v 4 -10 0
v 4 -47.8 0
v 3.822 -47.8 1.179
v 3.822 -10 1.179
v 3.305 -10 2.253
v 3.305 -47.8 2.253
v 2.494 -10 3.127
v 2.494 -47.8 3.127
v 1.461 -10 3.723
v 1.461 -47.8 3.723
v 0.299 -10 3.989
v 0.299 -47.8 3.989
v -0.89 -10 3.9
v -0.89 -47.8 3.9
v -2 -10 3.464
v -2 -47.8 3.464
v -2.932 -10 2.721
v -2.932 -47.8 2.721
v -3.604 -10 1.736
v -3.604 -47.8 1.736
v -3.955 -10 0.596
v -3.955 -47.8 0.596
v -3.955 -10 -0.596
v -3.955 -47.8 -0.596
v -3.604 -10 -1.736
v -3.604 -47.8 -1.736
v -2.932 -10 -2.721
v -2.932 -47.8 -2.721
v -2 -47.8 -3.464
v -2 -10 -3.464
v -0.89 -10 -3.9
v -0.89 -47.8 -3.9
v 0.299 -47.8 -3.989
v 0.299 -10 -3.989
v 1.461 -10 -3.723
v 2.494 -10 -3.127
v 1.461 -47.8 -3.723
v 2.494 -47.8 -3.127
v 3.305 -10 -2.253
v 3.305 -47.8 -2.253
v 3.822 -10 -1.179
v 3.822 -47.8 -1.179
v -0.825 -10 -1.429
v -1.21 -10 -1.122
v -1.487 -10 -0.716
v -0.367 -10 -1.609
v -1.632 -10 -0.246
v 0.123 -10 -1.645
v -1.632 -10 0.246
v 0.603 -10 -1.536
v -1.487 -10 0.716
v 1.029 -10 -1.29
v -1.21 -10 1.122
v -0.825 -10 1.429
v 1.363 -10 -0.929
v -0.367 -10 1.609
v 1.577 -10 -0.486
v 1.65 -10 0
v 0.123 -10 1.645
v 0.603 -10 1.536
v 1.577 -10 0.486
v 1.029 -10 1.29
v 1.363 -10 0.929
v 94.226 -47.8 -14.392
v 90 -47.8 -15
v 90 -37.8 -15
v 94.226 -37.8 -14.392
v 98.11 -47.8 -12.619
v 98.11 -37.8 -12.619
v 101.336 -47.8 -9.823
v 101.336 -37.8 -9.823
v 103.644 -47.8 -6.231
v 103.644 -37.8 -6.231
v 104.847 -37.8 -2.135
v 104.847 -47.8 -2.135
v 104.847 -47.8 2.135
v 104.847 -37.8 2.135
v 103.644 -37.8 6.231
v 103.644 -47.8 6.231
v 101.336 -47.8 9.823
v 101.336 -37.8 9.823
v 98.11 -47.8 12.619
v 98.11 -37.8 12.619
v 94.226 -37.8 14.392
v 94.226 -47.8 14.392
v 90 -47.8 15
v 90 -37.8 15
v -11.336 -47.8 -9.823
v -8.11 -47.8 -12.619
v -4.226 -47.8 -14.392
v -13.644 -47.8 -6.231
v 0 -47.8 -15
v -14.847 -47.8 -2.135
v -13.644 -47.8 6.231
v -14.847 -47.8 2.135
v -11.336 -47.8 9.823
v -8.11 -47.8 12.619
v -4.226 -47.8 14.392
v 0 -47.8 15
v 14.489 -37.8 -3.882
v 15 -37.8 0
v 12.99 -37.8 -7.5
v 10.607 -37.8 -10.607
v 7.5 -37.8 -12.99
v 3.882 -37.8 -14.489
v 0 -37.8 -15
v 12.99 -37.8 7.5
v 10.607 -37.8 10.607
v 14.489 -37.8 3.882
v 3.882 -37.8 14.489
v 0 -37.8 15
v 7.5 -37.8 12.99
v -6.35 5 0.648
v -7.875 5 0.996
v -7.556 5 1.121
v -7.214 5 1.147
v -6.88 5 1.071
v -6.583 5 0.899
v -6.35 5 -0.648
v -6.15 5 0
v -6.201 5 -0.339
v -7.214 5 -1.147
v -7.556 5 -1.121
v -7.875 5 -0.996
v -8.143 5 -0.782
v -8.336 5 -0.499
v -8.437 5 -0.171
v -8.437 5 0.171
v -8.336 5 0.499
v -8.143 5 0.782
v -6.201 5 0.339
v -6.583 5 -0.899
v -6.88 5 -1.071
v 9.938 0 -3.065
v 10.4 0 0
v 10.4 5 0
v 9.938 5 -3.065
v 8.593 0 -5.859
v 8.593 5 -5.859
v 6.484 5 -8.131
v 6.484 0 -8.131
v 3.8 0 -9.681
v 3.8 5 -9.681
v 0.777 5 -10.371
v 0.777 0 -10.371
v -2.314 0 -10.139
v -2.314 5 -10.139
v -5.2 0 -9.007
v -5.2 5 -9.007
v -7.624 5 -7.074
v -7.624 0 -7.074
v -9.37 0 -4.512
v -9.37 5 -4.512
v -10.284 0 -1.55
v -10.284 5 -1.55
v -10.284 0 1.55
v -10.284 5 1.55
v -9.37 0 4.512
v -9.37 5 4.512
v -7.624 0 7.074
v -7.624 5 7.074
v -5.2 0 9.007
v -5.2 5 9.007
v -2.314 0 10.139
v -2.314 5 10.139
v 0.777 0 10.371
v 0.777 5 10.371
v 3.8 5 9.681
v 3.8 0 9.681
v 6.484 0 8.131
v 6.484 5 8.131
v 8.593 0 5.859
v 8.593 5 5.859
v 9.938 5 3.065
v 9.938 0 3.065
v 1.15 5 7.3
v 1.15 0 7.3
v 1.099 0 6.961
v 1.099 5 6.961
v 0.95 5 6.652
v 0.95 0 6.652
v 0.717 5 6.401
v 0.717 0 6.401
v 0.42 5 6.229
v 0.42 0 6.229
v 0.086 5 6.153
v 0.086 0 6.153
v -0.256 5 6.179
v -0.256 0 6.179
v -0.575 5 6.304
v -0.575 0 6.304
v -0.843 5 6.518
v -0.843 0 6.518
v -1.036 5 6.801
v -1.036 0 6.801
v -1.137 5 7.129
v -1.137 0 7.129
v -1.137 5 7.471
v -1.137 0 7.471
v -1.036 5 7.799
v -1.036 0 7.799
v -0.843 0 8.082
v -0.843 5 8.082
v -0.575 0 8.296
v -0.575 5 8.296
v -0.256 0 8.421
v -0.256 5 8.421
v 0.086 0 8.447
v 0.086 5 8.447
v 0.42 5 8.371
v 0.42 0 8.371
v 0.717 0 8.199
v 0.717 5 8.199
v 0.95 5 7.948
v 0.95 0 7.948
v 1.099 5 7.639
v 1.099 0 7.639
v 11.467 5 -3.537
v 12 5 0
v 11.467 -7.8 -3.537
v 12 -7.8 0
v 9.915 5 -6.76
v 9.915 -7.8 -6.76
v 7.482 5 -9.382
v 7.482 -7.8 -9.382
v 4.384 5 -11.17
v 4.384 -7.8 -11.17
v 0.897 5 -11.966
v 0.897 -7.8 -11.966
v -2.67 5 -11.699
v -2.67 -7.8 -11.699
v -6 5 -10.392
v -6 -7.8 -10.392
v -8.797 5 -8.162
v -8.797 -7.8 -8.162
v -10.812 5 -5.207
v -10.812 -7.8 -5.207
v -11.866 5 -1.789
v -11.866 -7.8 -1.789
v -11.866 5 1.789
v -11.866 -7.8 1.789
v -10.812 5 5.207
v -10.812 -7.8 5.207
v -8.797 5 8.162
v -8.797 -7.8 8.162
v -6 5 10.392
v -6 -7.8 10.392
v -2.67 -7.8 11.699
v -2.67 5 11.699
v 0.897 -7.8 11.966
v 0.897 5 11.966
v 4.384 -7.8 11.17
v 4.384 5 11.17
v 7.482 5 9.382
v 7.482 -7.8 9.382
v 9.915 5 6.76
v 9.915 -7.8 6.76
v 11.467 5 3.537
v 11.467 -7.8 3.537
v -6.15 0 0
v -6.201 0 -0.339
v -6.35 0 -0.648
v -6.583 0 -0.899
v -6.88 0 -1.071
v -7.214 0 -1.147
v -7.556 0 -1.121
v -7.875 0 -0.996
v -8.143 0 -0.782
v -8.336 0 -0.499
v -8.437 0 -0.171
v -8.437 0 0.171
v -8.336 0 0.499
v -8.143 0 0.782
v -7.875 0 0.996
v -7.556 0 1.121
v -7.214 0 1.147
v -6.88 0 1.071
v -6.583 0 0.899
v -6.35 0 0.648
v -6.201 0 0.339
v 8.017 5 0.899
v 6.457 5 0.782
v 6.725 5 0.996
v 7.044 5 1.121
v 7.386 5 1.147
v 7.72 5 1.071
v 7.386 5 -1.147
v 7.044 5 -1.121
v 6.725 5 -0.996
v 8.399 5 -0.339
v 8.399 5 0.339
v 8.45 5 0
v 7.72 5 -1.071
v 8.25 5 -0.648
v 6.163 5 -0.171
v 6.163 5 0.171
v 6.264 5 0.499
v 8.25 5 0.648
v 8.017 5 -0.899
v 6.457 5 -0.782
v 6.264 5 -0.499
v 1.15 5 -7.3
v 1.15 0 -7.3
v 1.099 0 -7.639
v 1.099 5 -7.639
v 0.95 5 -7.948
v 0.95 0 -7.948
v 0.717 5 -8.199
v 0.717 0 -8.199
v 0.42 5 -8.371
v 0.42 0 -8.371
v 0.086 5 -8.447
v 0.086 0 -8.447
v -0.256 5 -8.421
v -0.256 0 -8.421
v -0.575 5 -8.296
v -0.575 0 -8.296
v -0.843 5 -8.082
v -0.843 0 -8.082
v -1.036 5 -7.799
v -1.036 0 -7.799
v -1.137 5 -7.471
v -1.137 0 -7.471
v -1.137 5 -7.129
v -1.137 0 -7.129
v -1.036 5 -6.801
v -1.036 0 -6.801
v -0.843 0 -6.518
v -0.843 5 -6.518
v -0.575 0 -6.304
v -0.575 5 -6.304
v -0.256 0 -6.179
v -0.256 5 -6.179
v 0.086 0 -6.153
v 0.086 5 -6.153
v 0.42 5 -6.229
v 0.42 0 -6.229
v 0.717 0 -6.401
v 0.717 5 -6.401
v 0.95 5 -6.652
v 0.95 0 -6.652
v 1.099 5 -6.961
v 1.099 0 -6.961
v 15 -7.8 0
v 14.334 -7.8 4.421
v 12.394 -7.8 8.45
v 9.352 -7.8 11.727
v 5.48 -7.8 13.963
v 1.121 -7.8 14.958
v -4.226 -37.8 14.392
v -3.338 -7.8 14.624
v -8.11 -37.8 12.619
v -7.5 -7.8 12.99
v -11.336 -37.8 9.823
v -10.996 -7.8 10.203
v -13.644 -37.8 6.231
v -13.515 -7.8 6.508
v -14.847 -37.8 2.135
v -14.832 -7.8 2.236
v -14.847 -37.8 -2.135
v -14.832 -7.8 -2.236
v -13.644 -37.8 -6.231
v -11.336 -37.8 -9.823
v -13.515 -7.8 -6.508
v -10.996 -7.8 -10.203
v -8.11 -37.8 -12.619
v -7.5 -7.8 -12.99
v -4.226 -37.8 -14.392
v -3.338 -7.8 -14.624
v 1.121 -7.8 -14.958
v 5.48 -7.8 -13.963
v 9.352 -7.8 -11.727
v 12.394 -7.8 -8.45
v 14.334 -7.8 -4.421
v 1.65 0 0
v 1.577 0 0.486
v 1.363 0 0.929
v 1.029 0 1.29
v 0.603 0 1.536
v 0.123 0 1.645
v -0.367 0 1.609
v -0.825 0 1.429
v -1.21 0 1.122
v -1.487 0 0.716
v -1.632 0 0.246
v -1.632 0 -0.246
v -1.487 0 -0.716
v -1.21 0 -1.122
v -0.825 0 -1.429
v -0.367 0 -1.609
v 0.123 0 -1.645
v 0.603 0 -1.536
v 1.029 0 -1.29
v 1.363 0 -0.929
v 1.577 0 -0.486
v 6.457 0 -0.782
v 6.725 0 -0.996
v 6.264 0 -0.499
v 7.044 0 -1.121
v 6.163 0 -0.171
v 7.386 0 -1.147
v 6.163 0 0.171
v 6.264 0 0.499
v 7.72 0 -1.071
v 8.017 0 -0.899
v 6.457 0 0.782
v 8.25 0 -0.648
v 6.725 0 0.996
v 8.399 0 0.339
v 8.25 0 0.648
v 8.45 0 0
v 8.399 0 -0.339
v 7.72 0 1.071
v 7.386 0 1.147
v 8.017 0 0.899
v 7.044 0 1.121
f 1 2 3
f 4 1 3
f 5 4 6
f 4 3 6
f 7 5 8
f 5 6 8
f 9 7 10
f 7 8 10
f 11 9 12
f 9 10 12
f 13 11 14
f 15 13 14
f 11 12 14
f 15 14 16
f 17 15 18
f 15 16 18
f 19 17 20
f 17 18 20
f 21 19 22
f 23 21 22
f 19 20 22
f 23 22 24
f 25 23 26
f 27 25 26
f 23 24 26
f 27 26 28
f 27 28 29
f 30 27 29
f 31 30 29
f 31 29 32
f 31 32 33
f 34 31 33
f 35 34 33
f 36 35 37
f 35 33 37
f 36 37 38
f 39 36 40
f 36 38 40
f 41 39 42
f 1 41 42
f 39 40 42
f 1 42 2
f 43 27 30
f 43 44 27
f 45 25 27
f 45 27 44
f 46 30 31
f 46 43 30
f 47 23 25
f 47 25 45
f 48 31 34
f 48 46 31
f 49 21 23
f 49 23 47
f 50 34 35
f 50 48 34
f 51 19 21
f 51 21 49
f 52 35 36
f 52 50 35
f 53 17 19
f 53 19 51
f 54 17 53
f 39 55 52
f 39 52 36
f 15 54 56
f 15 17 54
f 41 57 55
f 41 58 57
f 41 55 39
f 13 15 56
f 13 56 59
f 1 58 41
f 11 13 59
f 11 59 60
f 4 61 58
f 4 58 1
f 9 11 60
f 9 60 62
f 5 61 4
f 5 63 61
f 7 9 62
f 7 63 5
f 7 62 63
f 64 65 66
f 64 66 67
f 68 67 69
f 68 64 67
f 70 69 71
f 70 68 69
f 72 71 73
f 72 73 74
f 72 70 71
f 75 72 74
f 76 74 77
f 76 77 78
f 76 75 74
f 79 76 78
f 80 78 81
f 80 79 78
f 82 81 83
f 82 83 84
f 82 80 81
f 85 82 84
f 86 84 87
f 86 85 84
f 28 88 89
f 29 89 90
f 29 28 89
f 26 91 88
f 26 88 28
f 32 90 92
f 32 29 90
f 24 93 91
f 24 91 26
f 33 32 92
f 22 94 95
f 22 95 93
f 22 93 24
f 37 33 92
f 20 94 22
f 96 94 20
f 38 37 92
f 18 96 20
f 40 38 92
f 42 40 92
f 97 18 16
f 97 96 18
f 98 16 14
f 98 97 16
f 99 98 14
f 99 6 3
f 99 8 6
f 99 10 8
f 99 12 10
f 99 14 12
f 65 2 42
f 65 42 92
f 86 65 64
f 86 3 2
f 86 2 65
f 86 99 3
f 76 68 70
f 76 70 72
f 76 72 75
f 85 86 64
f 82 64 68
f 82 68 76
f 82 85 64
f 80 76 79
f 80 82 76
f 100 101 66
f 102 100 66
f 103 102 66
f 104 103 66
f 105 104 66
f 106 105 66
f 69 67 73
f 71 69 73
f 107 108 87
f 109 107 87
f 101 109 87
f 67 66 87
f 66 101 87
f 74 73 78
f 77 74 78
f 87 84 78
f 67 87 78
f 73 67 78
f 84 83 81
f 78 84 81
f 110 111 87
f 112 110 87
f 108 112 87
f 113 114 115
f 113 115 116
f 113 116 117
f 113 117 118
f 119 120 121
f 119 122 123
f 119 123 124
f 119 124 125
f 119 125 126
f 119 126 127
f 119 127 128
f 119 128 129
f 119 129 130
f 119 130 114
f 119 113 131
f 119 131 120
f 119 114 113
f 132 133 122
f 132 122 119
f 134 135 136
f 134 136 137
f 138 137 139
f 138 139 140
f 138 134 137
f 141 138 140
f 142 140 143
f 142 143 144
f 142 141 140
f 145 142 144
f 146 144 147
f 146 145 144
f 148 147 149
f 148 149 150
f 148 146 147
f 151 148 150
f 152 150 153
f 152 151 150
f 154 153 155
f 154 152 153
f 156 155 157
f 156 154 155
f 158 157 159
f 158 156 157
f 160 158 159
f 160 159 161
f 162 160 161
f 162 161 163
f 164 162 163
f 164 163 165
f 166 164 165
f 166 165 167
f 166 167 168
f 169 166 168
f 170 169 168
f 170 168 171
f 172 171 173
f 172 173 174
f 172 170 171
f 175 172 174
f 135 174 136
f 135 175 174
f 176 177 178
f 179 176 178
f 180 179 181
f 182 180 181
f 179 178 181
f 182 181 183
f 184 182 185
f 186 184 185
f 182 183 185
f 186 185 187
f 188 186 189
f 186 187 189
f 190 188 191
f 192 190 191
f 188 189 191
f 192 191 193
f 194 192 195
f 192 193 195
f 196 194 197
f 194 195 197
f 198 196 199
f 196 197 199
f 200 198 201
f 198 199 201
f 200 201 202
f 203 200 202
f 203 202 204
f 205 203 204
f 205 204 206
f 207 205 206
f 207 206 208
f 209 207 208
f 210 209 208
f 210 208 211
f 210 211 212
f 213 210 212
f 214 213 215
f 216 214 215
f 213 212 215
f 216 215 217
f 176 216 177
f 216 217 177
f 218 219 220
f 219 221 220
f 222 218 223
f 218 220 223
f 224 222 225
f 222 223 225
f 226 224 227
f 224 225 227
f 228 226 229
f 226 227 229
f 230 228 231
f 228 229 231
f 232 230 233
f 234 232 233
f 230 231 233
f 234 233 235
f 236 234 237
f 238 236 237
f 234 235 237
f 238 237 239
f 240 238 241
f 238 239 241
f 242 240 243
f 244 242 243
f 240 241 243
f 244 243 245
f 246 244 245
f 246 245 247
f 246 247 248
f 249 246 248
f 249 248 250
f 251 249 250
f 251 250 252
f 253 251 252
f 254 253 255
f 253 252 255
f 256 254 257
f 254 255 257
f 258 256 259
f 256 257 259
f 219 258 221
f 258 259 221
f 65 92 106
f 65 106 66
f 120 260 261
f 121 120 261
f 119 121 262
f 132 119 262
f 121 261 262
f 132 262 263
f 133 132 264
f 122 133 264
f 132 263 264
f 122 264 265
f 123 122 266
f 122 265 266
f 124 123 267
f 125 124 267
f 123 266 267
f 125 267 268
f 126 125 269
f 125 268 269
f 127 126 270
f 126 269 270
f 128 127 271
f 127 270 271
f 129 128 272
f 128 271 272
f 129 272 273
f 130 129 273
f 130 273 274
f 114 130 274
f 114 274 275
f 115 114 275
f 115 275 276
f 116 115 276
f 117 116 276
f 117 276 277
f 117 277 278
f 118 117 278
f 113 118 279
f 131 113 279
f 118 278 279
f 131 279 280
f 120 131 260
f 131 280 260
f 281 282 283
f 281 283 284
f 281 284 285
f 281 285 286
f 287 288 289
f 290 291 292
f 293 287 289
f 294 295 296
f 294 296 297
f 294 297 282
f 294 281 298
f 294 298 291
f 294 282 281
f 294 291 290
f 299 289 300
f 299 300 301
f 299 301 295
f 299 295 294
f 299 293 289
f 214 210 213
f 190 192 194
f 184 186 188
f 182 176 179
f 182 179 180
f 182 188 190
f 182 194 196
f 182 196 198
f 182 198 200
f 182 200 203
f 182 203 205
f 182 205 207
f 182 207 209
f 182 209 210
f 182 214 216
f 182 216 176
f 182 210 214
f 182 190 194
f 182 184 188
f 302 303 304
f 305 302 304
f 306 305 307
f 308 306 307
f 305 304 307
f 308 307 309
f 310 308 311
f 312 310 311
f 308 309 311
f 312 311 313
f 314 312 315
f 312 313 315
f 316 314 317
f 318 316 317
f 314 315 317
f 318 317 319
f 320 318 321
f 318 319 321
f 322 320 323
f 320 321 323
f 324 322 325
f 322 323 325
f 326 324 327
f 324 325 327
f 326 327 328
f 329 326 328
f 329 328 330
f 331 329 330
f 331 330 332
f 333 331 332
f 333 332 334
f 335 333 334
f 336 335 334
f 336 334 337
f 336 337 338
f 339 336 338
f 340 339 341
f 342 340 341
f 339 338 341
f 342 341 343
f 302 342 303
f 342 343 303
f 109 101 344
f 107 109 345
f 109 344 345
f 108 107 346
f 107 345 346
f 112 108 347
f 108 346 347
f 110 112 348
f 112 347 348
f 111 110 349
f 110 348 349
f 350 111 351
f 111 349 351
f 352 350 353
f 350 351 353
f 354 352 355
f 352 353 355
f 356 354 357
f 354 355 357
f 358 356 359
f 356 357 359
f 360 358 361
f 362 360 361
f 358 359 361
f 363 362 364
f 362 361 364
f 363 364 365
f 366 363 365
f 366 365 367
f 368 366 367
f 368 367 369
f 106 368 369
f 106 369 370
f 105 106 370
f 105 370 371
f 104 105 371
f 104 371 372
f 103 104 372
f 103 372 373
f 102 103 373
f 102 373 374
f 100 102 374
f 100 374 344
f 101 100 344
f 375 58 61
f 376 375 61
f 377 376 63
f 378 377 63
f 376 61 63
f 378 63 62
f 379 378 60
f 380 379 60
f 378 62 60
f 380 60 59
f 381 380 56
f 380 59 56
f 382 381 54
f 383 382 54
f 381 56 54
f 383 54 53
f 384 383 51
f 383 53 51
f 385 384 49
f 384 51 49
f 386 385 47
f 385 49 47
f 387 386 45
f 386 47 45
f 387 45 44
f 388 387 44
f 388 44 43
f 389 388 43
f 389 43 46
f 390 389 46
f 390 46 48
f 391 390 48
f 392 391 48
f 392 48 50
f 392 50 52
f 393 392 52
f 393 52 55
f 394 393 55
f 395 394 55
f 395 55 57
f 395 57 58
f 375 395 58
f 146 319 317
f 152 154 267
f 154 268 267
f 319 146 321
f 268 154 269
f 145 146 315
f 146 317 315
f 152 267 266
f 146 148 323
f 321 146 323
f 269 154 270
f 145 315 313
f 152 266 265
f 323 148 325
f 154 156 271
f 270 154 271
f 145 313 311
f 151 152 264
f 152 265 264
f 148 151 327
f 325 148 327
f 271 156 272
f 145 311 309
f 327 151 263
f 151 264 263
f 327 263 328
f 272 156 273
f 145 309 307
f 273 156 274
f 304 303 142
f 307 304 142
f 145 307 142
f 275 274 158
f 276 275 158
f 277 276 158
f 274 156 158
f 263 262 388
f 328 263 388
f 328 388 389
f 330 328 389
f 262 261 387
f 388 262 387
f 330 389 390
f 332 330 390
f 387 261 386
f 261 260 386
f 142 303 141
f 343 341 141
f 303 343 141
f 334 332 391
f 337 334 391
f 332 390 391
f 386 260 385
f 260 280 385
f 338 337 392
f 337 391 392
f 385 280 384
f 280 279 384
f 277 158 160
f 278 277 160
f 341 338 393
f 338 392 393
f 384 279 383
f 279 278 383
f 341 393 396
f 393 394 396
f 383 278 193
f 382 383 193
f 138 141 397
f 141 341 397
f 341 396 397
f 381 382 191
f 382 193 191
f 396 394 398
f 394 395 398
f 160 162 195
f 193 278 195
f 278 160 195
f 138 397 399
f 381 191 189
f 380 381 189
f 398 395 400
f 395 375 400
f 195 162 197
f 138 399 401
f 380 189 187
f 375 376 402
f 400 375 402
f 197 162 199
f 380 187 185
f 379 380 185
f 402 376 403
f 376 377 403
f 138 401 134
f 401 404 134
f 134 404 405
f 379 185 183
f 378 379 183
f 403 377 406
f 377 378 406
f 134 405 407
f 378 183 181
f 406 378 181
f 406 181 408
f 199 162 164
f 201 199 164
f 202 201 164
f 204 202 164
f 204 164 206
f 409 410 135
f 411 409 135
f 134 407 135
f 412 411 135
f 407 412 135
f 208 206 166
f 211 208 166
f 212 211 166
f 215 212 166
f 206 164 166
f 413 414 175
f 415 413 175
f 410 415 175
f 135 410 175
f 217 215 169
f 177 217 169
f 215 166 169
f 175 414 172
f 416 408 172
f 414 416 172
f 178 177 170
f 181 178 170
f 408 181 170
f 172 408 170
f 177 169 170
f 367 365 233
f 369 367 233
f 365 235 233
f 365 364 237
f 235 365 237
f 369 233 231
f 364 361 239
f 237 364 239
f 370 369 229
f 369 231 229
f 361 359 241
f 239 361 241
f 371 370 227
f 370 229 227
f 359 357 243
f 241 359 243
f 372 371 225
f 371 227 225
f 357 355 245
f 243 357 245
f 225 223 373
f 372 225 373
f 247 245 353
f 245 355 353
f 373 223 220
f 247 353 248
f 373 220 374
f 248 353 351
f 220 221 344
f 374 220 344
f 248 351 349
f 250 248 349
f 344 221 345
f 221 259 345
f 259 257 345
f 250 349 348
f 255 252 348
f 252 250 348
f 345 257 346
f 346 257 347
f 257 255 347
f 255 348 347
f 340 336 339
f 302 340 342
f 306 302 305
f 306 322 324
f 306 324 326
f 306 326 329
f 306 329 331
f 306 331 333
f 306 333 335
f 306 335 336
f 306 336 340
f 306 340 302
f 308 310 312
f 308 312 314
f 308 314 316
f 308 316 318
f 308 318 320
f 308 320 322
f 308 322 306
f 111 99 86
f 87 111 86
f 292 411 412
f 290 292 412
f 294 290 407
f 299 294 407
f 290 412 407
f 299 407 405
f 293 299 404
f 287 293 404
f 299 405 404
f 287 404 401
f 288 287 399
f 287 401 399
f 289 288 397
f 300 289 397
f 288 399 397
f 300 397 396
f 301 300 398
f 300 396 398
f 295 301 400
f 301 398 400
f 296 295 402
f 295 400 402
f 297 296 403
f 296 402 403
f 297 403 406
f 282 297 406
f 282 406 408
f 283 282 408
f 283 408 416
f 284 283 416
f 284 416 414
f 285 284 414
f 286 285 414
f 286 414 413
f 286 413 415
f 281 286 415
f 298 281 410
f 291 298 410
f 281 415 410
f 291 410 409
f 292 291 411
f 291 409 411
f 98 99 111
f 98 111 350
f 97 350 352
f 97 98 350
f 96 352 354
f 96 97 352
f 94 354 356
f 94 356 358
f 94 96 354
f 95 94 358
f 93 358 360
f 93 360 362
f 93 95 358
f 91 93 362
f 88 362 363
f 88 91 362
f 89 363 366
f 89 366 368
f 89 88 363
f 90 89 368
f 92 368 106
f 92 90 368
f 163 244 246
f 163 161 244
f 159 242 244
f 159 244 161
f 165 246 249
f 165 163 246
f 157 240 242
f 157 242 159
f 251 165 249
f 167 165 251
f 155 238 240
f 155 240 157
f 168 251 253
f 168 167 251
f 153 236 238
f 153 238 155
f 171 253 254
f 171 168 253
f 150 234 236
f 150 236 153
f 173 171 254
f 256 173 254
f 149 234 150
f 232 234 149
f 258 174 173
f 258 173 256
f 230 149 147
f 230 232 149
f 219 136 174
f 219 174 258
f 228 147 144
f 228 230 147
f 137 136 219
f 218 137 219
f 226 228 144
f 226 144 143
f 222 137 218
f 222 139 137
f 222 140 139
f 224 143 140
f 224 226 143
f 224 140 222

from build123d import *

# Parameters (mm, degrees)
SKETCH_R        = 12
PAD_DEPTH       = 7.8
SKETCH001_R     = 12
SKETCH001_R_2   = 10.4
SKETCH001_R_3   = 1.15
PAD001_DEPTH    = 5
SKETCH002_R     = 15
PAD002_DEPTH    = 40
PAD003_DEPTH    = 10
SKETCH004_R     = 1.65
POCKET_DEPTH    = 52.801
SKETCH005_R     = 4
POCKET001_DEPTH = 37.8


with BuildPart() as part:
    # Sketch → Pad (new body)
    with BuildSketch(Plane.XZ):
        Circle(SKETCH_R)
    extrude(amount=PAD_DEPTH)

    # Sketch001 (on Face2 of Pad) → Pad001 (join)
    with BuildSketch(Plane(origin=(0, 0, 0), x_dir=(1, 0, 0), z_dir=(0, 1, 0))):
        Circle(SKETCH001_R)
        Circle(SKETCH001_R_2, mode=Mode.SUBTRACT)
        with Locations((0, 7.3)):
            Circle(SKETCH001_R_3)
        with Locations((7.3, 0)):
            Circle(SKETCH001_R_3)
        with Locations((0, -7.3)):
            Circle(SKETCH001_R_3)
        with Locations((-7.3, 0)):
            Circle(SKETCH001_R_3)
    extrude(amount=PAD001_DEPTH)

    # Sketch002 (on Face1 of Pad001) → Pad002 (join)
    with BuildSketch(Plane.XZ.offset(7.8)):
        Circle(SKETCH002_R)
    extrude(amount=PAD002_DEPTH)

    # Sketch003 (on Face6 of Pad002) → Pad003 (join)
    with BuildSketch(Plane.XZ.offset(47.8)):
        with BuildLine():
            ThreePointArc((0, 15), (-15, 0), (0, -15))
            Line((0, -15), (90, -15))
            ThreePointArc((90, -15), (105, 0), (90, 15))
            Line((0, 15), (90, 15))
        make_face()
    extrude(amount=-PAD003_DEPTH)

    # Sketch004 (on Face5 of Pad003) → Pocket (cut, through all)
    with BuildSketch(Plane.XZ.offset(47.8)):
        Circle(SKETCH004_R)
    extrude(amount=-POCKET_DEPTH, mode=Mode.SUBTRACT)

    # Sketch005 (on Face6 of Pocket) → Pocket001 (cut)
    with BuildSketch(Plane.XZ.offset(47.8)):
        Circle(SKETCH005_R)
    extrude(amount=-POCKET001_DEPTH, mode=Mode.SUBTRACT)


solid = part.part
